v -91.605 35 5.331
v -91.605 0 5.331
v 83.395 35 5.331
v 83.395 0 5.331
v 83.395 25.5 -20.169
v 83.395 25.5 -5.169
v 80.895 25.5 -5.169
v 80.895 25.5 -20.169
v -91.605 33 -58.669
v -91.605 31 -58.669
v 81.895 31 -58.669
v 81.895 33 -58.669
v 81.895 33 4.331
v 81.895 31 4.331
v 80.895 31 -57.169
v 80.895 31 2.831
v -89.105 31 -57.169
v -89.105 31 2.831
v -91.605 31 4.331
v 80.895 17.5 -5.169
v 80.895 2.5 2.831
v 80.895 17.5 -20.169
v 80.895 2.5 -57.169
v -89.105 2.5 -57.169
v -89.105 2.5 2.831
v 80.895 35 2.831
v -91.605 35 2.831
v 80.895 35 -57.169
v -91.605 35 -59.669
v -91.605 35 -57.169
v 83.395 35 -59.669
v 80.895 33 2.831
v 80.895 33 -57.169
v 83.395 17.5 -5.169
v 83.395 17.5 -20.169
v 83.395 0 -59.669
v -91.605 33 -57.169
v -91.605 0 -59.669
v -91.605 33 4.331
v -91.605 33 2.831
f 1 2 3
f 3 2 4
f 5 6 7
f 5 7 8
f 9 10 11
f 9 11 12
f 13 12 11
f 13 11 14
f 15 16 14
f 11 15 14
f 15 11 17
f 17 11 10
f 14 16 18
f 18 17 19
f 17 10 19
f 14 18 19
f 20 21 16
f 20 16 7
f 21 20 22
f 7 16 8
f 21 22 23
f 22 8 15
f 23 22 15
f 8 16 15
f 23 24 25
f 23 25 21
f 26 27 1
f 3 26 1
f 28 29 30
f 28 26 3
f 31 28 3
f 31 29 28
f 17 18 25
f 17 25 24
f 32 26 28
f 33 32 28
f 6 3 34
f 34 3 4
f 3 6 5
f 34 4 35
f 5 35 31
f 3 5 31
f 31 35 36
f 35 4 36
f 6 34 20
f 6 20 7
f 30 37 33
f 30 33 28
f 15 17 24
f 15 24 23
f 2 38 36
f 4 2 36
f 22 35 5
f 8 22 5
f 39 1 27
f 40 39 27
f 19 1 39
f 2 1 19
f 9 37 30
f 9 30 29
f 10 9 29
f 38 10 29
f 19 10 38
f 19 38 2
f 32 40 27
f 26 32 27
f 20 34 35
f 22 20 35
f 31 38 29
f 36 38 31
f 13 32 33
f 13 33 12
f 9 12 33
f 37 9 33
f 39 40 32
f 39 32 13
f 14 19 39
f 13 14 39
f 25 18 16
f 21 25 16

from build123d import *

# Parameters (mm, degrees)
SKETCH2_W           = 175
SKETCH2_H           = 65
BOSS_EXTRUDE1_DEPTH = 35
SKETCH3_W           = 170
SKETCH3_H           = 60
CUT_EXTRUDE1_DEPTH  = 32.5
SKETCH4_W           = 15
SKETCH4_H           = 8
CUT_EXTRUDE3_DEPTH  = 172.5
SKETCH5_W           = 63
SKETCH5_H           = 2
CUT_EXTRUDE5_DEPTH  = 173.5
SKETCH7_W           = 60
SKETCH7_H           = 2
CUT_EXTRUDE6_DEPTH  = 2.5


with BuildPart() as part:
    # Sketch2 → Boss-Extrude1 (new body)
    with BuildSketch(Plane(origin=(0, 0, 0), x_dir=(1, 0, 0), z_dir=(0, 1, 0))):
        with Locations((-4.104793892, 27.168582034)):
            Rectangle(SKETCH2_W, SKETCH2_H)
    extrude(amount=BOSS_EXTRUDE1_DEPTH)

    # Sketch3 → Cut-Extrude1 (cut)
    with BuildSketch(Plane(origin=(0, 35, 0), x_dir=(1, 0, 0), z_dir=(0, 1, 0))):
        with Locations((-4.104793892, 27.168582034)):
            Rectangle(SKETCH3_W, SKETCH3_H)
    extrude(amount=-CUT_EXTRUDE1_DEPTH, mode=Mode.SUBTRACT)

    # Sketch4 → Cut-Extrude3 (cut)
    with BuildSketch(Plane(origin=(83.395206108, 0, 0), x_dir=(0, 0, -1), z_dir=(1, 0, 0))):
        with Locations((12.668582034, 21.5)):
            Rectangle(SKETCH4_W, SKETCH4_H)
    extrude(amount=-CUT_EXTRUDE3_DEPTH, mode=Mode.SUBTRACT)

    # Sketch5 → Cut-Extrude5 (cut)
    with BuildSketch(Plane.ZY.offset(91.604793892)):
        with Locations((-27.168582034, 32)):
            Rectangle(SKETCH5_W, SKETCH5_H)
    extrude(amount=-CUT_EXTRUDE5_DEPTH, mode=Mode.SUBTRACT)

    # Sketch7 → Cut-Extrude6 (cut)
    with BuildSketch(Plane.ZY.offset(91.604793892)):
        with Locations((-27.168582034, 34)):
            Rectangle(SKETCH7_W, SKETCH7_H)
    extrude(amount=-CUT_EXTRUDE6_DEPTH, mode=Mode.SUBTRACT)


solid = part.part
